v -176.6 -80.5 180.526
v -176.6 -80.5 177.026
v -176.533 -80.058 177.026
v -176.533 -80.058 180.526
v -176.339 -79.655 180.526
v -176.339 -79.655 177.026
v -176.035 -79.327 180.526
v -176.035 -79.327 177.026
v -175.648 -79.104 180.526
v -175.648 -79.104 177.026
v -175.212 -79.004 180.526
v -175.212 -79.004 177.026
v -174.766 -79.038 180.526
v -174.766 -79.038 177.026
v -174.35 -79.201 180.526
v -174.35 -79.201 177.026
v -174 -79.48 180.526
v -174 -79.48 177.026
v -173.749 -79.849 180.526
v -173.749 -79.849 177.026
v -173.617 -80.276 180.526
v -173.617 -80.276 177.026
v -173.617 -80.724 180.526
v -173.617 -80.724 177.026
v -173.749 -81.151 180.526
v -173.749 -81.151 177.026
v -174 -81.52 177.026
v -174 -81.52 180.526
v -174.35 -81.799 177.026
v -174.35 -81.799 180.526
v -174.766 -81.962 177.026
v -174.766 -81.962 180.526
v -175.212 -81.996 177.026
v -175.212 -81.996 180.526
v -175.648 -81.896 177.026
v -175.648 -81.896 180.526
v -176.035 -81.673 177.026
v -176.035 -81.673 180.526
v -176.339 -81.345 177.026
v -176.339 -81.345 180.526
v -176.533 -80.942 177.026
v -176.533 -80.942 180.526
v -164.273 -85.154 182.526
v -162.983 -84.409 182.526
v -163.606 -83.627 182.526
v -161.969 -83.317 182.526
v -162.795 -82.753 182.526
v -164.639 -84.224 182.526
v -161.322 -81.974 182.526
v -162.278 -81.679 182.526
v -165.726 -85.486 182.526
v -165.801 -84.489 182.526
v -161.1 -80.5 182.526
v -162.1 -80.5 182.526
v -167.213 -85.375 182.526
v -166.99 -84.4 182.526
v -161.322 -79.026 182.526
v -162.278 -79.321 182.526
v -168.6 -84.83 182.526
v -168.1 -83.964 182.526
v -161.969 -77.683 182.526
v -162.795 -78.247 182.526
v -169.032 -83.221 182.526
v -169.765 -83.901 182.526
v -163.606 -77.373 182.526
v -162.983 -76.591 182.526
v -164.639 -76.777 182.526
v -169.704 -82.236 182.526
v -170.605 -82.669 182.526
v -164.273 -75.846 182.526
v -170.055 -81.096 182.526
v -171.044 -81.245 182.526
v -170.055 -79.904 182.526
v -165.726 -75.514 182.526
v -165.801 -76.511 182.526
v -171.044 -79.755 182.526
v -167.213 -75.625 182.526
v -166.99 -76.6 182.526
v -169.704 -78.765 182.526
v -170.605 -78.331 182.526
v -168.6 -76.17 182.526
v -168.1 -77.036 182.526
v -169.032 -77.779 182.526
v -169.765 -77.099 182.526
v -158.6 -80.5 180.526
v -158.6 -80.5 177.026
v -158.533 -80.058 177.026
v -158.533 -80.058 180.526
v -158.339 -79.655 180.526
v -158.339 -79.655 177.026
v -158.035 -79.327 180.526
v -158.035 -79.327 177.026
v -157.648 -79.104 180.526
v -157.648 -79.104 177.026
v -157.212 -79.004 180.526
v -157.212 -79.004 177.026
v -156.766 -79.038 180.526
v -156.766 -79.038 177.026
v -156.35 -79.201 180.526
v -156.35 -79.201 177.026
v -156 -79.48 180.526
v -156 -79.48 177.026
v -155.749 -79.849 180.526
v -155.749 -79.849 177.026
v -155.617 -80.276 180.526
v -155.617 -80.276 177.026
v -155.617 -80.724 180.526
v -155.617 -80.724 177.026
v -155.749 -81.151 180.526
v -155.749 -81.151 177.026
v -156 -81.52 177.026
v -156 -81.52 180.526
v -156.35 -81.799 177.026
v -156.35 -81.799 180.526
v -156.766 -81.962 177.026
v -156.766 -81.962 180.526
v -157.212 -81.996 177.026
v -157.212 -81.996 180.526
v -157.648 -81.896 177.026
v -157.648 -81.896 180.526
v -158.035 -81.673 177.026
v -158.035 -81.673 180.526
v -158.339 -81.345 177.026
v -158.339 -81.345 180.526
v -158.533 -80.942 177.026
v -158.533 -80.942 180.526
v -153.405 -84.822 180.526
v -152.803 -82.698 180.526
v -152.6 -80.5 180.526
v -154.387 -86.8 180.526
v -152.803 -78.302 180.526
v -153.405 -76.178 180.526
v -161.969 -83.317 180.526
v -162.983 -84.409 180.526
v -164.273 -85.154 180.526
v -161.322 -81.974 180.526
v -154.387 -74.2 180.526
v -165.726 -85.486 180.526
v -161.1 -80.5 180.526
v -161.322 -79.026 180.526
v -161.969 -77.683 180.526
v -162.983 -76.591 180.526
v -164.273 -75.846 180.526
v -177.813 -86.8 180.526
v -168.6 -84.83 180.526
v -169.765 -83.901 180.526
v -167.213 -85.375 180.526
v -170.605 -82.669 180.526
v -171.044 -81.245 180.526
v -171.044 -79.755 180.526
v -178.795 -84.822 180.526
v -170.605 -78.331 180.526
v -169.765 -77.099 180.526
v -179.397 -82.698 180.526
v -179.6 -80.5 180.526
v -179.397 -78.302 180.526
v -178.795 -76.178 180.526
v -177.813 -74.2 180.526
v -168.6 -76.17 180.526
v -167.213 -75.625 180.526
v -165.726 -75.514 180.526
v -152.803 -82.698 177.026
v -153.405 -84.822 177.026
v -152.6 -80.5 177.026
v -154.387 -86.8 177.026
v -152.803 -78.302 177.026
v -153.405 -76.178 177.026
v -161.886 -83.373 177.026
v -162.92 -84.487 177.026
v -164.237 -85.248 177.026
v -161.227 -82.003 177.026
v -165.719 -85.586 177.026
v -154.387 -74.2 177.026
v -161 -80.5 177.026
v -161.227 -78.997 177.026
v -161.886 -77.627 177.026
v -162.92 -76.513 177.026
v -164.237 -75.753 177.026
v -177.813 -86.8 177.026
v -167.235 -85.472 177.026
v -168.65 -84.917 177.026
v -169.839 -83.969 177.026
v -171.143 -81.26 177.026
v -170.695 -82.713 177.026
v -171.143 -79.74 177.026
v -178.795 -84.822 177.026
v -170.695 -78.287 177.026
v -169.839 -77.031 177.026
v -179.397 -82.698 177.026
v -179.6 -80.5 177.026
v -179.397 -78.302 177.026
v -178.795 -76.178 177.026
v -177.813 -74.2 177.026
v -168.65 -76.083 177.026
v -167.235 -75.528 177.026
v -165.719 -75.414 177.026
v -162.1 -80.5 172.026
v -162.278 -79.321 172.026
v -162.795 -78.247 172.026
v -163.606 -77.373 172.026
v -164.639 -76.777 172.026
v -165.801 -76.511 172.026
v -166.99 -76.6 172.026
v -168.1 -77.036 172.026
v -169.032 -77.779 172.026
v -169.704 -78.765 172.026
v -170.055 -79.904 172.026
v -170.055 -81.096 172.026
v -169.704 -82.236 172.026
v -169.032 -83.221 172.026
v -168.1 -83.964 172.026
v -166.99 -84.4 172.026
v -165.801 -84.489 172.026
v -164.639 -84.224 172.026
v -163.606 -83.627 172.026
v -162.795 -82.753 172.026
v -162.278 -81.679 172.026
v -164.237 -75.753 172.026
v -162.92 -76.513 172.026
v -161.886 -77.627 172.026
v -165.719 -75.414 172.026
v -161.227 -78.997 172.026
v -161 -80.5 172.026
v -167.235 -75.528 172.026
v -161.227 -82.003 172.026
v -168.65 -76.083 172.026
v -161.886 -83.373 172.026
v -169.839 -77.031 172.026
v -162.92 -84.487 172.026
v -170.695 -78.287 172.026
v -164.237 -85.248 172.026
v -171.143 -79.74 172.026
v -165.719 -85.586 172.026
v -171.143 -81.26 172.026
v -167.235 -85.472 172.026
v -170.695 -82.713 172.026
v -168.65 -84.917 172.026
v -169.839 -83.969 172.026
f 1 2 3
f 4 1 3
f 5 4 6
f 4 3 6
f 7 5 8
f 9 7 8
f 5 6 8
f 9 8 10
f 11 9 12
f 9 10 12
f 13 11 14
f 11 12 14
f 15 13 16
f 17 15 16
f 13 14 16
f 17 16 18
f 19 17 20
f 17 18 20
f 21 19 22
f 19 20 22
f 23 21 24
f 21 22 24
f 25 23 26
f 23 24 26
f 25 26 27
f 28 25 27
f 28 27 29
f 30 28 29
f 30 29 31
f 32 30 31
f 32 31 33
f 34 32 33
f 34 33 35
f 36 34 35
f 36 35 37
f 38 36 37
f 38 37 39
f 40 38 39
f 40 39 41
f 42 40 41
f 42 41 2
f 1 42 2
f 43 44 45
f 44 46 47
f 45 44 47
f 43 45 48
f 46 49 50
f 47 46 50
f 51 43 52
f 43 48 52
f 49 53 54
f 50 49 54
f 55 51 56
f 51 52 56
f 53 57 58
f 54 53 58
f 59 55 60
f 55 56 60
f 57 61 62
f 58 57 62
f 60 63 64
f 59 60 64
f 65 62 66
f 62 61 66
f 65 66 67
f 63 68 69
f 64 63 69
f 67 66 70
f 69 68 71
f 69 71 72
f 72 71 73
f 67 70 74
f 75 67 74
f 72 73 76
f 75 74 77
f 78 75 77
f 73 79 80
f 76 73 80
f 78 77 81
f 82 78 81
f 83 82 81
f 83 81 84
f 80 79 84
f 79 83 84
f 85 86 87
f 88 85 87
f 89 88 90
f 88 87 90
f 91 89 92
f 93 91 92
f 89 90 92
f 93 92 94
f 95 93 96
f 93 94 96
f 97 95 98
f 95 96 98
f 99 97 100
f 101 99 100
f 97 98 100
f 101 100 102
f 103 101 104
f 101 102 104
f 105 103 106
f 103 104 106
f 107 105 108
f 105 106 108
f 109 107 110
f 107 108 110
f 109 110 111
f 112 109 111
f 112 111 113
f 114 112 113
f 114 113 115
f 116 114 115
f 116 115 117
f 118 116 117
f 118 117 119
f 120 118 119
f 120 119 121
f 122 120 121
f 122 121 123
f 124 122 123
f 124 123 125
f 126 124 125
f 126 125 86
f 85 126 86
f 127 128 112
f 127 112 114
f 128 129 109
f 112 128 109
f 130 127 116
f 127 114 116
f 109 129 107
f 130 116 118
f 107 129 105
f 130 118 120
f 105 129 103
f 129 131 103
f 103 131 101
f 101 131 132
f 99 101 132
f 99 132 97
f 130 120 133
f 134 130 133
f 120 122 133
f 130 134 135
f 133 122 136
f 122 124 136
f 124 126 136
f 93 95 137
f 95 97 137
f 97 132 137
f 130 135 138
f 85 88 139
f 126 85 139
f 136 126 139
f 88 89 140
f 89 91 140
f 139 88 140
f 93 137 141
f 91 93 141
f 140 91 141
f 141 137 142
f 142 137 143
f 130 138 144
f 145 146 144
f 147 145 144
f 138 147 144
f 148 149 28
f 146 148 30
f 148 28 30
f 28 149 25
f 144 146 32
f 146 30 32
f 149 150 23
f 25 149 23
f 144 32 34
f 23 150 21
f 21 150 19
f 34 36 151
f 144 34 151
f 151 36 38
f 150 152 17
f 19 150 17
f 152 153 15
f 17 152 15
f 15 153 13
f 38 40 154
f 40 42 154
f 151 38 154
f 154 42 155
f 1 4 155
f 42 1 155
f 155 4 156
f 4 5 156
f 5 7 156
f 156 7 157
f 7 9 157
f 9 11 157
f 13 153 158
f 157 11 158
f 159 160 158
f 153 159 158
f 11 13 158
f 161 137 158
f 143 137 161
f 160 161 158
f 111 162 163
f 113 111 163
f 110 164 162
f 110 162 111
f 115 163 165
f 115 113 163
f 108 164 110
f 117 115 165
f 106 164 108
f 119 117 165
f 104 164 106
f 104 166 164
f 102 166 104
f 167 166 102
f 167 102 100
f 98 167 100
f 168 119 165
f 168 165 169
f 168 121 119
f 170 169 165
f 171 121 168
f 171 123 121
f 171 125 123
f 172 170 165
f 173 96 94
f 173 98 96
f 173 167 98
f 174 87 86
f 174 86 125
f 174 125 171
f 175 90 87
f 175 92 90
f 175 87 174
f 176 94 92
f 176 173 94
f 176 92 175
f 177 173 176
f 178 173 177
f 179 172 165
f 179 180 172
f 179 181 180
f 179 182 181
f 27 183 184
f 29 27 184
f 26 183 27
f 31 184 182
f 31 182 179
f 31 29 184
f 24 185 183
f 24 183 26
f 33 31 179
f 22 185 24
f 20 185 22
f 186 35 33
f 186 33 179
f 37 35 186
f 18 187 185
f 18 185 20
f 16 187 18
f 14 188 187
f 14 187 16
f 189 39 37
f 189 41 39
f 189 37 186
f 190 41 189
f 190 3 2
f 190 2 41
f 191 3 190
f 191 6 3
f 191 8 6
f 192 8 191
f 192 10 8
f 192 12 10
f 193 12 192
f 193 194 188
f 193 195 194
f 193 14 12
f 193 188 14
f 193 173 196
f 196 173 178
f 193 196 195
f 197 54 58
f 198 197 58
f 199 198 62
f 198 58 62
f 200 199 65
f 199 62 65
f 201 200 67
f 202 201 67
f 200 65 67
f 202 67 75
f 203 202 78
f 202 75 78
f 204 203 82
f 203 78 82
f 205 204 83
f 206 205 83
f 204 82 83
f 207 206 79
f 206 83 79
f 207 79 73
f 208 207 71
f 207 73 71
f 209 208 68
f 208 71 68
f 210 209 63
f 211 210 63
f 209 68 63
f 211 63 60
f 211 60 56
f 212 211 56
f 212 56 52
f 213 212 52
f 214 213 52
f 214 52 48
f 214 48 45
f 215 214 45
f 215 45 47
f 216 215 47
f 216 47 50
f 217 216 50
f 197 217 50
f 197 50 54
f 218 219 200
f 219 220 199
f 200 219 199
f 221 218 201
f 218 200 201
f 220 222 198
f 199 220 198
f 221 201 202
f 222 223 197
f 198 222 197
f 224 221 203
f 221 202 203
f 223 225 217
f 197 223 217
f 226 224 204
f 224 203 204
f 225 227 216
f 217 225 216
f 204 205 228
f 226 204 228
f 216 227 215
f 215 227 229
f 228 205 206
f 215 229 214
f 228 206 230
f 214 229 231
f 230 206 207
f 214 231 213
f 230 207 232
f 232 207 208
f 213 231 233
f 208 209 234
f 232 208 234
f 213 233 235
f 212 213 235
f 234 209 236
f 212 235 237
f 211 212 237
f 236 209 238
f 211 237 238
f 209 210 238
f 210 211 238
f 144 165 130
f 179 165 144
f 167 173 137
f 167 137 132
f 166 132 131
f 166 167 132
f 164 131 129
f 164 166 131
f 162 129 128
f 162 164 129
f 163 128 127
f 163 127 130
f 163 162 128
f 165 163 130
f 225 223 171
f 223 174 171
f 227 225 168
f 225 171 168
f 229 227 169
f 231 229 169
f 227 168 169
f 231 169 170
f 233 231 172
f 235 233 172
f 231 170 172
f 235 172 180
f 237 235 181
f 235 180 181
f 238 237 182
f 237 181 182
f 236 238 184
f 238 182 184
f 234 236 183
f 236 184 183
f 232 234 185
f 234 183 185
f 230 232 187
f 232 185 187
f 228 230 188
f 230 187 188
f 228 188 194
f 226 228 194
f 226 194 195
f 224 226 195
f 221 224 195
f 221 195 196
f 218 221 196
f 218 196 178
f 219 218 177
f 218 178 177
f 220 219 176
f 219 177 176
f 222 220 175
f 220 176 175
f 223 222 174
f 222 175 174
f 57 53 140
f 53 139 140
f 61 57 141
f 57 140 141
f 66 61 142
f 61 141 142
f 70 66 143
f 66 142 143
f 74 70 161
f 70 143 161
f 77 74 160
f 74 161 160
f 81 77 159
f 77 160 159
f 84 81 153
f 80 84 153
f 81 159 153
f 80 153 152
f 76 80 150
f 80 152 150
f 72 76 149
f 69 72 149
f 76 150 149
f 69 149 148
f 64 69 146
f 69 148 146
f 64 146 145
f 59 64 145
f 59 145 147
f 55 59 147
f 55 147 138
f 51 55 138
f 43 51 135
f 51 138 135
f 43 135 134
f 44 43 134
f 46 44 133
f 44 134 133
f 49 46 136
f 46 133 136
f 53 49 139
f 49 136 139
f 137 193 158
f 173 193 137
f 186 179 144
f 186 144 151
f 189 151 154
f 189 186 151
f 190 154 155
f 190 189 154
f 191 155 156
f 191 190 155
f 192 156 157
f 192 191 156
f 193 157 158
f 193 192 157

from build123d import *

# Parameters (mm, degrees)
BOSS_EXTRUDE1_DEPTH          = 3.5
SKETCH2_W                    = 5
SKETCH2_H                    = 2
SKETCH3_W                    = 5.1
SKETCH3_H                    = 5
F_3_0_3_DIAMETER_HOLE1_D     = 3
F_3_0_3_DIAMETER_HOLE1_DEPTH = 8.5
F_8_0_8_DIAMETER_HOLE1_D     = 8
F_8_0_8_DIAMETER_HOLE1_DEPTH = 10.5


with BuildPart() as part:
    # Sketch1 → Boss-Extrude1 (new body)
    with BuildSketch(Plane(origin=(0, 0, 177.026431985), x_dir=(-1, 0, 0), z_dir=(0, 0, -1))):
        with BuildLine():
            Line((177.813226718, -74.200057886), (154.386773282, -74.200057886))
            ThreePointArc((154.386773282, -74.200057886), (152.6, -80.500057886), (154.386773282, -86.800057886))
            Line((154.386773282, -86.800057886), (177.813226718, -86.800057886))
            ThreePointArc((177.813226718, -86.800057886), (179.6, -80.500057886), (177.813226718, -74.200057886))
        make_face()
    extrude(amount=-BOSS_EXTRUDE1_DEPTH)

    # Sketch2 → Revolve1 (revolve)
    with BuildSketch(Plane(origin=(0, -80.500057886, 0), x_dir=(1, 0, 0), z_dir=(0, 1, 0))):
        with Locations((-163.6, -181.526431985)):
            Rectangle(SKETCH2_W, SKETCH2_H)
    revolve(axis=Axis((-166.1, -80.500057886, 180.526431985), (0, 0, 1)))

    # Sketch3 → Revolve2 (revolve)
    with BuildSketch(Plane.XZ.offset(80.500057886)):
        with Locations((-163.55, 174.526431985)):
            Rectangle(SKETCH3_W, SKETCH3_H)
    revolve(axis=Axis((-166.1, -80.500057886, 177.026431985), (0, 0, -1)))

    # Ø3.0 (3) Diameter Hole1
    with Locations(Plane.XY.offset(180.526431985)):
        with Locations((-157.1, -80.500057886), (-175.1, -80.500057886)):
            Hole(F_3_0_3_DIAMETER_HOLE1_D / 2, depth=F_3_0_3_DIAMETER_HOLE1_DEPTH)

    # Ø8.0 (8) Diameter Hole1
    with Locations(Plane(origin=(0, 0, 172.026431985), x_dir=(-1, 0, 0), z_dir=(0, 0, -1))):
        with Locations((166.1, -80.500057886)):
            Hole(F_8_0_8_DIAMETER_HOLE1_D / 2, depth=F_8_0_8_DIAMETER_HOLE1_DEPTH)


solid = part.part
